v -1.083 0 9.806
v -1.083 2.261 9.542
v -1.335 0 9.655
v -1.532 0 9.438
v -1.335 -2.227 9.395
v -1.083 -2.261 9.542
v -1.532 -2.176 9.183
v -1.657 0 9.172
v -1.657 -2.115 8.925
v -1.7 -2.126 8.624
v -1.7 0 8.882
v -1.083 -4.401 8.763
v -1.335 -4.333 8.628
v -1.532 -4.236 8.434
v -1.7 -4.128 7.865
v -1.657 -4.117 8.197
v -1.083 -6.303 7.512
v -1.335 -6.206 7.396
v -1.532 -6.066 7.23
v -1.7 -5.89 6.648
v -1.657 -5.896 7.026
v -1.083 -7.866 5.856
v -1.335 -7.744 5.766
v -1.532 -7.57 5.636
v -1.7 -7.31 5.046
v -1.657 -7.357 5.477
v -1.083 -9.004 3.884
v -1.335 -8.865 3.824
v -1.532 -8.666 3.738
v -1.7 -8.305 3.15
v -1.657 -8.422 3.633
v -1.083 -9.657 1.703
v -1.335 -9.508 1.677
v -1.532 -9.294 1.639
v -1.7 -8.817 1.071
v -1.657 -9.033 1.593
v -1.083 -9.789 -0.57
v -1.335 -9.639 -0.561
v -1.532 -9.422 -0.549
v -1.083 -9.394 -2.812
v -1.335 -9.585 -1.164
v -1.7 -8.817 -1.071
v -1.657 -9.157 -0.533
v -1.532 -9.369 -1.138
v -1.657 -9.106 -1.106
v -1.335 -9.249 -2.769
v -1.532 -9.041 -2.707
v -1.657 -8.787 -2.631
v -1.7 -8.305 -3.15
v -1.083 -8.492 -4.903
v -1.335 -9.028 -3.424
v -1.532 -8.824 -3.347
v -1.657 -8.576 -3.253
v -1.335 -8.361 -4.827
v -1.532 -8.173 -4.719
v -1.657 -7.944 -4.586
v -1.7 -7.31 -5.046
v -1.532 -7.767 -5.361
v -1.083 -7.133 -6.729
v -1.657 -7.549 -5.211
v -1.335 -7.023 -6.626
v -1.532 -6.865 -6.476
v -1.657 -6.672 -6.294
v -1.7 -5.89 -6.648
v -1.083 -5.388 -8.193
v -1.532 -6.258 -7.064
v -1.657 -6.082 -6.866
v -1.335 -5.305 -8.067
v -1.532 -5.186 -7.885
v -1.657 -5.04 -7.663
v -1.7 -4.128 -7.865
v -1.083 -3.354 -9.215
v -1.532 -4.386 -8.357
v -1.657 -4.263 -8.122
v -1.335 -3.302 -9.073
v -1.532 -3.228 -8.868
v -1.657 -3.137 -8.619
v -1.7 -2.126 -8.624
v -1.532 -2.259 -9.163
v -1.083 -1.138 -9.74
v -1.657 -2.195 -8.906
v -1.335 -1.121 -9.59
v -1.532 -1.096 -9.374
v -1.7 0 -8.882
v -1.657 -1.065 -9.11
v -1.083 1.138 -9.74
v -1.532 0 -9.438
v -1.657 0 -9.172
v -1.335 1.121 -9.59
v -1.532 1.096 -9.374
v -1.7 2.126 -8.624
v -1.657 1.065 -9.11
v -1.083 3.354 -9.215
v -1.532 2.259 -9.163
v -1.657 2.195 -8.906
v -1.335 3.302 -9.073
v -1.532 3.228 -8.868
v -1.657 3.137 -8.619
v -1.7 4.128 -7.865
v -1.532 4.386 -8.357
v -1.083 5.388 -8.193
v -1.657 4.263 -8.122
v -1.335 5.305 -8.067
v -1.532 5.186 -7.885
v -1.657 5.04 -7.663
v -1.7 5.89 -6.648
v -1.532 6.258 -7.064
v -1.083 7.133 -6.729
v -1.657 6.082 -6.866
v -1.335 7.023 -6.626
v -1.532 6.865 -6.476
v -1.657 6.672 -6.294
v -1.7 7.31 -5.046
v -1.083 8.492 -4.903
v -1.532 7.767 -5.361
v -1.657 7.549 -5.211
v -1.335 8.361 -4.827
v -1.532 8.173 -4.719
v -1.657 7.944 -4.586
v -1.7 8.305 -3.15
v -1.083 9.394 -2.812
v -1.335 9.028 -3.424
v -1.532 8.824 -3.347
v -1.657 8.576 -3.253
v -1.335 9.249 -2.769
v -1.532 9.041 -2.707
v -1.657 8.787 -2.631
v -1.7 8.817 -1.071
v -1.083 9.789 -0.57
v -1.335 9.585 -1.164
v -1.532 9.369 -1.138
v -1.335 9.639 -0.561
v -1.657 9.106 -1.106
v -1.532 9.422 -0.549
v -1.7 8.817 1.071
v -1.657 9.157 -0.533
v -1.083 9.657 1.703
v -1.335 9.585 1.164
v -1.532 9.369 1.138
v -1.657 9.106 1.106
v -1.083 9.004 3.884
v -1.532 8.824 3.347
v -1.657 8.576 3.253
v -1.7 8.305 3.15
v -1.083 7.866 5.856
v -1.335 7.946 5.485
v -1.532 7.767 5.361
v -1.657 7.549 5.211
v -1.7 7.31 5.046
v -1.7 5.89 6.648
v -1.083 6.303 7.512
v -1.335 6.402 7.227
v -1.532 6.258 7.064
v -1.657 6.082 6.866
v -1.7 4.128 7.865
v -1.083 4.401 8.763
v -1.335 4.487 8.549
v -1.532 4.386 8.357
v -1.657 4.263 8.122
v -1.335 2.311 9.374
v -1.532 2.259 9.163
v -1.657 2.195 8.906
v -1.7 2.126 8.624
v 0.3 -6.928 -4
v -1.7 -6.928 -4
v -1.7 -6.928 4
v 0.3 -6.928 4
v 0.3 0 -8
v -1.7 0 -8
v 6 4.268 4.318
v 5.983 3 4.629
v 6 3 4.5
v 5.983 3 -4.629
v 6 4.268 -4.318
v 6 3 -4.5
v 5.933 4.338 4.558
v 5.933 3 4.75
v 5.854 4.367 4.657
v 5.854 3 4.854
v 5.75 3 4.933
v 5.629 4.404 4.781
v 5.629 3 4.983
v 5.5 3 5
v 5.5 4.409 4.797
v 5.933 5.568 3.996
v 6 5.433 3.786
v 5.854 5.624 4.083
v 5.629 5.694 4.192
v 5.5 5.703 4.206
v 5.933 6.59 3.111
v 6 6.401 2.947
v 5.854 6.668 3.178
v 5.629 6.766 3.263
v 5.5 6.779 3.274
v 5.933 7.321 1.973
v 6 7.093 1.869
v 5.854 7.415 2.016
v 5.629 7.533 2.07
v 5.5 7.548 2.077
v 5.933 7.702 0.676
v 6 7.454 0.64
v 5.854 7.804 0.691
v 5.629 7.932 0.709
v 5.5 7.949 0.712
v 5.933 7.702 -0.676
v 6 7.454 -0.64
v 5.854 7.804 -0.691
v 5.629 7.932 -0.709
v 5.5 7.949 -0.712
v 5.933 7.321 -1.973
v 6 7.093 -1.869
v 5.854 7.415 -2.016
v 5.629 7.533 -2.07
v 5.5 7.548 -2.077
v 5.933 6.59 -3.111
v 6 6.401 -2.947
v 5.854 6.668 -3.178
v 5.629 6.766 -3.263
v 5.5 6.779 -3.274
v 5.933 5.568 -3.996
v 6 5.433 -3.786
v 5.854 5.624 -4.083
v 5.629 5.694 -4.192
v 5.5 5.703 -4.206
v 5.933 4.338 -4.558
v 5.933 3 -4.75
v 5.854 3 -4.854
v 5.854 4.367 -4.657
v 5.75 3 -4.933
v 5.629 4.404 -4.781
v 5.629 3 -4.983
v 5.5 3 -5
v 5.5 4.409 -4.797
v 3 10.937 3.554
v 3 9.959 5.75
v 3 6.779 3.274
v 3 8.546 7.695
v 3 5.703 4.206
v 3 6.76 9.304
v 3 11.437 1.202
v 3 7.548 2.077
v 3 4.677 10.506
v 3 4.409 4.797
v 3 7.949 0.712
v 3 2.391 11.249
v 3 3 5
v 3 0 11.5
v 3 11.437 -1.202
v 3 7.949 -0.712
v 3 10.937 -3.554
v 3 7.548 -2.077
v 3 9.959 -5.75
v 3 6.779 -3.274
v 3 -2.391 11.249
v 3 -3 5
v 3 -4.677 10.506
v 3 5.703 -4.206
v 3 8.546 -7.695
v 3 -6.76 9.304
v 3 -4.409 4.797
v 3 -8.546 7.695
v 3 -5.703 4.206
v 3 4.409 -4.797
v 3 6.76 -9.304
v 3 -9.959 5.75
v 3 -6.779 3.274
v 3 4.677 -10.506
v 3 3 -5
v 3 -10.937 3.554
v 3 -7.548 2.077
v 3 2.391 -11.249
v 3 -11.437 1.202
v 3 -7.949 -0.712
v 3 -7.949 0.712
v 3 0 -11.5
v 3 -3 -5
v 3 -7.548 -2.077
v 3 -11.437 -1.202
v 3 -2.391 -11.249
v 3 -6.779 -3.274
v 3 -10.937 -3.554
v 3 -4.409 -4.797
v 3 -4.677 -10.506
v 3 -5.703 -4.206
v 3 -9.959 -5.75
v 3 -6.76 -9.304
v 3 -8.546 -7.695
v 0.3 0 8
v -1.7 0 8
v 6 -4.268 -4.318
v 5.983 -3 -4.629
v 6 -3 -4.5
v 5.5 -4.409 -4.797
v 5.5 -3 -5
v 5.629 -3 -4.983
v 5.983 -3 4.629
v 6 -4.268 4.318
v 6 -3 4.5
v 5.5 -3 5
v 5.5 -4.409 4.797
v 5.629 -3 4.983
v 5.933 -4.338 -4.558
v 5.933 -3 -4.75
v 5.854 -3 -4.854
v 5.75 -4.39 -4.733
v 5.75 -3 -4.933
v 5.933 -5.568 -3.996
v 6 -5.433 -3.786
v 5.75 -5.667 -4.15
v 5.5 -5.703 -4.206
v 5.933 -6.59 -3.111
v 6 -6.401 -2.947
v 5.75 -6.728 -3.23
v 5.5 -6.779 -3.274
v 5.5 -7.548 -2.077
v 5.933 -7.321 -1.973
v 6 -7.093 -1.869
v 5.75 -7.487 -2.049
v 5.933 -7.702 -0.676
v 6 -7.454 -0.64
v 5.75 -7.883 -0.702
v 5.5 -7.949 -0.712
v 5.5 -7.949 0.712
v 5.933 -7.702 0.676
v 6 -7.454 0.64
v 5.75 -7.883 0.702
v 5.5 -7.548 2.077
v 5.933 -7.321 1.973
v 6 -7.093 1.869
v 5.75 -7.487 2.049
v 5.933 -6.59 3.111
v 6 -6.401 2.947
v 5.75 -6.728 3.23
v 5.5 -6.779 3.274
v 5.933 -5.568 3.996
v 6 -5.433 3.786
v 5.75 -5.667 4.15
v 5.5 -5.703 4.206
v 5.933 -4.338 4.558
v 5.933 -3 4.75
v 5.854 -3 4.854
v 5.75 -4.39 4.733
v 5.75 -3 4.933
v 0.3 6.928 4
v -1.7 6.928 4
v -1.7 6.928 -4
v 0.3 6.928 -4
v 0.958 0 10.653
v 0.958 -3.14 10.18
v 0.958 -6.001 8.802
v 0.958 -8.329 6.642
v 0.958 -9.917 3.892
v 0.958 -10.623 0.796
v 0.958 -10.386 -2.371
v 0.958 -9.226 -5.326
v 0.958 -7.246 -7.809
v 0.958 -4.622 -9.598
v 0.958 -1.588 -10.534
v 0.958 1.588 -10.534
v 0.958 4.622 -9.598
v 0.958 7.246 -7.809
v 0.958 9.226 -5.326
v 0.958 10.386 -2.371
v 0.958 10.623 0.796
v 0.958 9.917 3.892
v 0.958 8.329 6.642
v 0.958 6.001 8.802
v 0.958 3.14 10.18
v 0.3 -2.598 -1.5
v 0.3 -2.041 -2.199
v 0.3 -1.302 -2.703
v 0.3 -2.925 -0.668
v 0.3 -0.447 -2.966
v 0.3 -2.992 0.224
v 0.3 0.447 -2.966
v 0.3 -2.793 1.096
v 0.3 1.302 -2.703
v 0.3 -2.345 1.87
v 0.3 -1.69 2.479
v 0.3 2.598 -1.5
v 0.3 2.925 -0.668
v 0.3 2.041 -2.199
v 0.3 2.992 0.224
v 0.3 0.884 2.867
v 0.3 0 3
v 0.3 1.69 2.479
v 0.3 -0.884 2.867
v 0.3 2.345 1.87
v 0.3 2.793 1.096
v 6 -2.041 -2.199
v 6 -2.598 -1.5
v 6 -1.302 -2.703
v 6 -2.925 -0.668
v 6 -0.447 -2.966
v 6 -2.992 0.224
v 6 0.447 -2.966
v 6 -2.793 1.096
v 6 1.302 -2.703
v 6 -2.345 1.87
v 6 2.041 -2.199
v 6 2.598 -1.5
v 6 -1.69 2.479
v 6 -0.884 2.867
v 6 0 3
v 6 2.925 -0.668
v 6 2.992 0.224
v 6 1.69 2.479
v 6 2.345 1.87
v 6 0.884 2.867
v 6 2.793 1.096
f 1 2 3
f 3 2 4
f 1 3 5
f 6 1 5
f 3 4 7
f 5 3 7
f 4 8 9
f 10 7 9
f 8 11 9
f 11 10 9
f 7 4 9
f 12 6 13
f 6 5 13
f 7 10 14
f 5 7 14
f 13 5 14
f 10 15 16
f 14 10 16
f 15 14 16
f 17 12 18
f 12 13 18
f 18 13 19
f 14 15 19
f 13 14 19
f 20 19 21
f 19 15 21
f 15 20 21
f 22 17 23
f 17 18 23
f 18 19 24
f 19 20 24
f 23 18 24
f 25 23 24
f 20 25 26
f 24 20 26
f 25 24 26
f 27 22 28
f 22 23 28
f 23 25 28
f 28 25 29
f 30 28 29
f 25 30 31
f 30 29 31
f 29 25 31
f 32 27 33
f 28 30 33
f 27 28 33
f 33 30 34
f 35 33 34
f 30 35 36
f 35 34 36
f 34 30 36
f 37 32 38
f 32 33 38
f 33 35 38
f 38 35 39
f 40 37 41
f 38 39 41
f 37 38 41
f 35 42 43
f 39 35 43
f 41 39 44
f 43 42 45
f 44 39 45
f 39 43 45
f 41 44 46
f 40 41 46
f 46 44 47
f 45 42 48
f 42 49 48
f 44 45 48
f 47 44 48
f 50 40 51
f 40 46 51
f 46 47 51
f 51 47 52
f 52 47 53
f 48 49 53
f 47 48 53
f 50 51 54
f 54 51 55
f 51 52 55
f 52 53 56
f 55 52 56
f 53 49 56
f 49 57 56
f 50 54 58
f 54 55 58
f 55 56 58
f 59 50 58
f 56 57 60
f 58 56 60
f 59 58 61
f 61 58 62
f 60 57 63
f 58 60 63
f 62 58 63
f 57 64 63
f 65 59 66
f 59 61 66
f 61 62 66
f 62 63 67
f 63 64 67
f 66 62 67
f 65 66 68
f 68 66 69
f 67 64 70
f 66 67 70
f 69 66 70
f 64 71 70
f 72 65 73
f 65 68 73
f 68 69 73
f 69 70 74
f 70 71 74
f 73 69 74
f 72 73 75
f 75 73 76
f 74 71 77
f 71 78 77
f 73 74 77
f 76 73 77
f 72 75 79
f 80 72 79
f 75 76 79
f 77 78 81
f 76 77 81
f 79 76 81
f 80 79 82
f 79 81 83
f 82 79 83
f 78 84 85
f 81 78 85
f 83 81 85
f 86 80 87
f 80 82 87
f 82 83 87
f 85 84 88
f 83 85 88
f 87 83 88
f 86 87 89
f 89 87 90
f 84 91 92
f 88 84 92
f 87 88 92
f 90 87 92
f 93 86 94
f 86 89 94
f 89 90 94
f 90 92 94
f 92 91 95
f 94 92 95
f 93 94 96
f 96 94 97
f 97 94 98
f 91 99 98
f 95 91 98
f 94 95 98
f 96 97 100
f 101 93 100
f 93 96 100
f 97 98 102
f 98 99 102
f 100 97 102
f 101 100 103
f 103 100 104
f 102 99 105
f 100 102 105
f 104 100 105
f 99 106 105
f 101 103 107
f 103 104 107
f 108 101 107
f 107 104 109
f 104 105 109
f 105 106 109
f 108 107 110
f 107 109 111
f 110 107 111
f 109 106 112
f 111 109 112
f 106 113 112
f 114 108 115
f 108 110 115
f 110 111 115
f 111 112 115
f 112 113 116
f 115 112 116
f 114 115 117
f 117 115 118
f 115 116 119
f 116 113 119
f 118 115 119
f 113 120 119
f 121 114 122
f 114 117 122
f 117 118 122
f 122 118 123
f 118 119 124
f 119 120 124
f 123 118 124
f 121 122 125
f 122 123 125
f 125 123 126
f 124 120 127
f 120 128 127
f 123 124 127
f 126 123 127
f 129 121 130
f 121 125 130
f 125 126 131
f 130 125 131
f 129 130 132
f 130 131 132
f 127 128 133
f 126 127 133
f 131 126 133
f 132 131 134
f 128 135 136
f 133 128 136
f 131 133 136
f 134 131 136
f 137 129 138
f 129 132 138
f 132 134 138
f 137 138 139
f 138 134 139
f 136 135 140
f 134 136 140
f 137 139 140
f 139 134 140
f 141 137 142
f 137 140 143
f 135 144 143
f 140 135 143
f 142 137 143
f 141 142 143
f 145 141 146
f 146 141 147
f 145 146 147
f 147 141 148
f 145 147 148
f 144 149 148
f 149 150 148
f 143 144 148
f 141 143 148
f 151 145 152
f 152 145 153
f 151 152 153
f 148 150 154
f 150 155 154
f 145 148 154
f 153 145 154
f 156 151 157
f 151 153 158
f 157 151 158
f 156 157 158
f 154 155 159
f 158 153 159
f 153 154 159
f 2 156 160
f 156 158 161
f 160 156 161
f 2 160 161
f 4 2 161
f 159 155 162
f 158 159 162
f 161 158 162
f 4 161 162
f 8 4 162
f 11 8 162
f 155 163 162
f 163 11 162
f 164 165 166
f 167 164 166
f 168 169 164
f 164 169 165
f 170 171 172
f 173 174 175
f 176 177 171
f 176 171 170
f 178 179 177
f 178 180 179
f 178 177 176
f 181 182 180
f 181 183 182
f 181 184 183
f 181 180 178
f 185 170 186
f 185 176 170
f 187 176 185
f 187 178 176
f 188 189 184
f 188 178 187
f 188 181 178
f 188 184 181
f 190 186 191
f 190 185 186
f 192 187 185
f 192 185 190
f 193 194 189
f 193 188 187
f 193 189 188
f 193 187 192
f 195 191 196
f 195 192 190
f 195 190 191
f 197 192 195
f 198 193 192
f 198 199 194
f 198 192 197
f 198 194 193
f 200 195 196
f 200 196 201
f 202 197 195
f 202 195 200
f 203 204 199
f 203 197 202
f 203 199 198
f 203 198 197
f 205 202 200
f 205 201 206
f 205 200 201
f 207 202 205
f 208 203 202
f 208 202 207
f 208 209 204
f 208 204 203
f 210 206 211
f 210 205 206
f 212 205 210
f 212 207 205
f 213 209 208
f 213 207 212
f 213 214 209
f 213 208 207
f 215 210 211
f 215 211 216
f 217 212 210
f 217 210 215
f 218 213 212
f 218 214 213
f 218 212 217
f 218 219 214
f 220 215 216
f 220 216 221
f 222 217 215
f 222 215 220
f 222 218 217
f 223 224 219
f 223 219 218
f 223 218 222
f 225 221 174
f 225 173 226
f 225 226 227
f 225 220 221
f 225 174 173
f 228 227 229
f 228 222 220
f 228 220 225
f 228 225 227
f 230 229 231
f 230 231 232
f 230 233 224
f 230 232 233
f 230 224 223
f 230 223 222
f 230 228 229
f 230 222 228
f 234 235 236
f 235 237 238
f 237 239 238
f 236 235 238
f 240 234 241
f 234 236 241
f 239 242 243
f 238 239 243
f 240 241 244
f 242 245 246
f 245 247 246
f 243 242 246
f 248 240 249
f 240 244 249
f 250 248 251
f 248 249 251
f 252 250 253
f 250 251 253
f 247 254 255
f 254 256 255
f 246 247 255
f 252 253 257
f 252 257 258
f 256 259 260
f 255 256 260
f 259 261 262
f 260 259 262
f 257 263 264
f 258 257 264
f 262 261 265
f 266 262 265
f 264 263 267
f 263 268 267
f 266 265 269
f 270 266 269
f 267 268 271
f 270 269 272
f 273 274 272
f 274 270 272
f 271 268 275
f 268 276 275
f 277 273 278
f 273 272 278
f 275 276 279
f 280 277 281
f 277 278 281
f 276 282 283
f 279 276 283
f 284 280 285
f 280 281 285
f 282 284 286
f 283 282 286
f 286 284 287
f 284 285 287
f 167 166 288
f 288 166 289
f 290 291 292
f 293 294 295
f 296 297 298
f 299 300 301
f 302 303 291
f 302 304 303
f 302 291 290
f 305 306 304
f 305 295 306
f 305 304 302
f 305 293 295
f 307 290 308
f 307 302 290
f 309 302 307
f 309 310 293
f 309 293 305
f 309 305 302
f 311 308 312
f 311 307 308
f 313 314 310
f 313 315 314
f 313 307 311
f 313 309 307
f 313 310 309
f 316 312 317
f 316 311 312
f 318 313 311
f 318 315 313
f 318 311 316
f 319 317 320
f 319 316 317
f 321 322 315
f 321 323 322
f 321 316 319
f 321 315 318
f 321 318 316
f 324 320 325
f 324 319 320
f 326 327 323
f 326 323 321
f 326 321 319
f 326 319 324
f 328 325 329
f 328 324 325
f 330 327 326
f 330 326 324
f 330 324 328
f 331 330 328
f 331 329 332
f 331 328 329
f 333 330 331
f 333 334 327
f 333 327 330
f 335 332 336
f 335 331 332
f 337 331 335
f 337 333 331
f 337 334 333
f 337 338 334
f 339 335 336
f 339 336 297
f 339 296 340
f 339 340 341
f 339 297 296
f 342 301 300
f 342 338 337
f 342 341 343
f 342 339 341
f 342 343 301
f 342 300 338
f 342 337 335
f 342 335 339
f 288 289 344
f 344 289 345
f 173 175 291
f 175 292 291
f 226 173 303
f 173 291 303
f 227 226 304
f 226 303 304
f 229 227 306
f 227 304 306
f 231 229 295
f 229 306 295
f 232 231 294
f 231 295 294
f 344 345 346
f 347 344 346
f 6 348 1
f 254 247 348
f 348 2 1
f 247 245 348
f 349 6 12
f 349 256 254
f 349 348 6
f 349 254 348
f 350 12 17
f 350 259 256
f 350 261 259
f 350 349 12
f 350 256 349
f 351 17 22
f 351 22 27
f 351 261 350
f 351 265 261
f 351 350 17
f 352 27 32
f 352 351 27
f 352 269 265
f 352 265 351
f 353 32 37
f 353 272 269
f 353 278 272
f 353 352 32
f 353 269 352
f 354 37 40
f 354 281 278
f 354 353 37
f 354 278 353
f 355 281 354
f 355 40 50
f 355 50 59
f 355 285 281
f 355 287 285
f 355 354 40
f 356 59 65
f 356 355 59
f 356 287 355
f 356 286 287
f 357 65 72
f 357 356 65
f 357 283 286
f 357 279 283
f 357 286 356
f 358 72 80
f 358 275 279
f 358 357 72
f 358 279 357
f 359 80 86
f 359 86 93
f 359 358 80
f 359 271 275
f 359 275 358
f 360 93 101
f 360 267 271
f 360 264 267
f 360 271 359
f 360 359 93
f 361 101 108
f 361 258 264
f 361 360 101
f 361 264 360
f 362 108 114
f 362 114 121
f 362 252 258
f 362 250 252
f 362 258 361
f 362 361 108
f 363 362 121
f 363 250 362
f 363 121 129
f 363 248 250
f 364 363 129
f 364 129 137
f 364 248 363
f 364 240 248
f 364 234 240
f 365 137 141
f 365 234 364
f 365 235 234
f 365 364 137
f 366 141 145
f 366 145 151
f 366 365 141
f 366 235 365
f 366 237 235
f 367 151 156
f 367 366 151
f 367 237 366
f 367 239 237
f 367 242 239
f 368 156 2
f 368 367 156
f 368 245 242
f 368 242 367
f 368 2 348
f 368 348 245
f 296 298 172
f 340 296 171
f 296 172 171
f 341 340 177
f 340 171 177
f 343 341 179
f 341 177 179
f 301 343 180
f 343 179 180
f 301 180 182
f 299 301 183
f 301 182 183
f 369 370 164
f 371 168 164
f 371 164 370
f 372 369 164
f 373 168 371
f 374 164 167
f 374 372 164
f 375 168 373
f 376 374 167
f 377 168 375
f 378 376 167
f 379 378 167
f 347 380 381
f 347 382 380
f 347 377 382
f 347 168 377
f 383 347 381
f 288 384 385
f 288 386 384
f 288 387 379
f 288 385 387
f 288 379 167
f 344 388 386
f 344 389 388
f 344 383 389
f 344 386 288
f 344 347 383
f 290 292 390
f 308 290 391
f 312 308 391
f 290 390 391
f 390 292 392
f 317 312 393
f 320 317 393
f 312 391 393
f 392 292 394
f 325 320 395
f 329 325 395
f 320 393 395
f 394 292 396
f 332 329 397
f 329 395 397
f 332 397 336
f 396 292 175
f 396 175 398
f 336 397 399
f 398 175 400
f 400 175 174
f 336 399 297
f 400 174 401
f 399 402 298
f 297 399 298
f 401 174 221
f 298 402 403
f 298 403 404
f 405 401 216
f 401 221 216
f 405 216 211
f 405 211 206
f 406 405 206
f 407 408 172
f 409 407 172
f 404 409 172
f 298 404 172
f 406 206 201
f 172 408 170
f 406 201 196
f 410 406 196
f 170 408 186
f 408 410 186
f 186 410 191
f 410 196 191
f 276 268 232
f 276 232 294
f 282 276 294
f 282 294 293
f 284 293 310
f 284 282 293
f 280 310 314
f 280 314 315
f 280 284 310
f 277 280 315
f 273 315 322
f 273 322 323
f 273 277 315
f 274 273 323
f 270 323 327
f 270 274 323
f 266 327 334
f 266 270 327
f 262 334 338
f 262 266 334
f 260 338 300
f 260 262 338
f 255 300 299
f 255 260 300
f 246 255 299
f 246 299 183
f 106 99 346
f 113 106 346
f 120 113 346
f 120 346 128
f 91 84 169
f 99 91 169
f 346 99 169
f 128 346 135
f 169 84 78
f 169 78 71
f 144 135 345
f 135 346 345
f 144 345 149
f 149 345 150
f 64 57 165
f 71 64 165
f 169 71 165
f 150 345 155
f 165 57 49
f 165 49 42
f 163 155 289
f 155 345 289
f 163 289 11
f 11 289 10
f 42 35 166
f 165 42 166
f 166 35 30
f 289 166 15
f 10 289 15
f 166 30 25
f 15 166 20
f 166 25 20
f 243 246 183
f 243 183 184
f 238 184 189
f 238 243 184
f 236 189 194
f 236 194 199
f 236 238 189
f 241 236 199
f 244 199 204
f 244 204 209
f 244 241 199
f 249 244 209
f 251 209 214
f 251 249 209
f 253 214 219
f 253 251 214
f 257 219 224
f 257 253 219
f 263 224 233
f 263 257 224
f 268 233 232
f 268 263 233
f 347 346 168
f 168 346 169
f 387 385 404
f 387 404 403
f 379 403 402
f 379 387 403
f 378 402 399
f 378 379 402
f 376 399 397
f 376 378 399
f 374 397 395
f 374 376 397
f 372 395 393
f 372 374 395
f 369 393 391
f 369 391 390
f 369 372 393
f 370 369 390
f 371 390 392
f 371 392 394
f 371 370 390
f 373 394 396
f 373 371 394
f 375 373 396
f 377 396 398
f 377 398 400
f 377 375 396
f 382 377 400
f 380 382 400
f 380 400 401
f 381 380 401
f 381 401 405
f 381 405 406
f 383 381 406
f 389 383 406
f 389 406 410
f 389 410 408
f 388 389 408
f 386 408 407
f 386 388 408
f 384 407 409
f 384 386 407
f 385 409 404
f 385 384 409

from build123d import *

# Parameters (mm, degrees)
SKETCH_1_W          = 1.7
SKETCH_1_H          = 4.55
FILLET_1_R          = 1
SKETCH_3_R          = 3
EXTRUDE_1_DEPTH     = 3
FILLET_3_R          = 0.5
CUT_EXTRUDE_1_DEPTH = 2


with BuildPart() as part:
    # Эскиз1 → Повернуть1 (revolve)
    with BuildSketch(Plane.XY, mode=Mode.PRIVATE) as revolve_1_sk:
        with Locations((-0.85, 5.275)):
            Rectangle(SKETCH_1_W, SKETCH_1_H)
        Polygon((3, 7.03692641), (3, 3), (0, 3), (0, 7.55), (-1.7, 7.55), (-1.7, 9.55), (3, 11.5), align=None)
    revolve(revolve_1_sk.sketch.rotate(Axis((0, 0, 0), (1, 0, 0)), 90), axis=Axis((0, 0, 0), (1, 0, 0)))

    # Скругление1
    fillet_1_edges = [part.edges().sort_by_distance(p)[0] for p in [
        (-1.7, 0, -9.55),
    ]]
    fillet(fillet_1_edges, radius=FILLET_1_R)

    # Эскиз3 → Бобышка-Вытянуть1 (add)
    with BuildSketch(Plane(origin=(3, 0, 0), x_dir=(0, 0, -1), z_dir=(1, 0, 0))):
        with BuildLine():
            Line((-5, -3), (-5, 3))
            ThreePointArc((-5, 3), (0, 8), (5, 3))
            Line((5, 3), (5, -3))
            ThreePointArc((5, -3), (0, -8), (-5, -3))
        make_face()
        with Locations(Location((0, 0, 0), (0, 0, 180))):
            Circle(SKETCH_3_R, mode=Mode.SUBTRACT)
    extrude(amount=EXTRUDE_1_DEPTH)

    # Скругление3
    fillet_3_edges = [part.edges().sort_by_distance(p)[0] for p in [
        (6, -8, 0),
        (6, 0, -5),
        (6, 8, 0),
        (6, 0, 5),
    ]]
    fillet(fillet_3_edges, radius=FILLET_3_R)

    # Эскиз4 → Вырез-Вытянуть1 (cut)
    with BuildSketch(Plane.ZY.offset(1.7)):
        Polygon((4, 6.92820323), (-4, 6.92820323), (-8, 0), (-4, -6.92820323), (4, -6.92820323), (8, 0), align=None)
    extrude(amount=-CUT_EXTRUDE_1_DEPTH, mode=Mode.SUBTRACT)


solid = part.part
